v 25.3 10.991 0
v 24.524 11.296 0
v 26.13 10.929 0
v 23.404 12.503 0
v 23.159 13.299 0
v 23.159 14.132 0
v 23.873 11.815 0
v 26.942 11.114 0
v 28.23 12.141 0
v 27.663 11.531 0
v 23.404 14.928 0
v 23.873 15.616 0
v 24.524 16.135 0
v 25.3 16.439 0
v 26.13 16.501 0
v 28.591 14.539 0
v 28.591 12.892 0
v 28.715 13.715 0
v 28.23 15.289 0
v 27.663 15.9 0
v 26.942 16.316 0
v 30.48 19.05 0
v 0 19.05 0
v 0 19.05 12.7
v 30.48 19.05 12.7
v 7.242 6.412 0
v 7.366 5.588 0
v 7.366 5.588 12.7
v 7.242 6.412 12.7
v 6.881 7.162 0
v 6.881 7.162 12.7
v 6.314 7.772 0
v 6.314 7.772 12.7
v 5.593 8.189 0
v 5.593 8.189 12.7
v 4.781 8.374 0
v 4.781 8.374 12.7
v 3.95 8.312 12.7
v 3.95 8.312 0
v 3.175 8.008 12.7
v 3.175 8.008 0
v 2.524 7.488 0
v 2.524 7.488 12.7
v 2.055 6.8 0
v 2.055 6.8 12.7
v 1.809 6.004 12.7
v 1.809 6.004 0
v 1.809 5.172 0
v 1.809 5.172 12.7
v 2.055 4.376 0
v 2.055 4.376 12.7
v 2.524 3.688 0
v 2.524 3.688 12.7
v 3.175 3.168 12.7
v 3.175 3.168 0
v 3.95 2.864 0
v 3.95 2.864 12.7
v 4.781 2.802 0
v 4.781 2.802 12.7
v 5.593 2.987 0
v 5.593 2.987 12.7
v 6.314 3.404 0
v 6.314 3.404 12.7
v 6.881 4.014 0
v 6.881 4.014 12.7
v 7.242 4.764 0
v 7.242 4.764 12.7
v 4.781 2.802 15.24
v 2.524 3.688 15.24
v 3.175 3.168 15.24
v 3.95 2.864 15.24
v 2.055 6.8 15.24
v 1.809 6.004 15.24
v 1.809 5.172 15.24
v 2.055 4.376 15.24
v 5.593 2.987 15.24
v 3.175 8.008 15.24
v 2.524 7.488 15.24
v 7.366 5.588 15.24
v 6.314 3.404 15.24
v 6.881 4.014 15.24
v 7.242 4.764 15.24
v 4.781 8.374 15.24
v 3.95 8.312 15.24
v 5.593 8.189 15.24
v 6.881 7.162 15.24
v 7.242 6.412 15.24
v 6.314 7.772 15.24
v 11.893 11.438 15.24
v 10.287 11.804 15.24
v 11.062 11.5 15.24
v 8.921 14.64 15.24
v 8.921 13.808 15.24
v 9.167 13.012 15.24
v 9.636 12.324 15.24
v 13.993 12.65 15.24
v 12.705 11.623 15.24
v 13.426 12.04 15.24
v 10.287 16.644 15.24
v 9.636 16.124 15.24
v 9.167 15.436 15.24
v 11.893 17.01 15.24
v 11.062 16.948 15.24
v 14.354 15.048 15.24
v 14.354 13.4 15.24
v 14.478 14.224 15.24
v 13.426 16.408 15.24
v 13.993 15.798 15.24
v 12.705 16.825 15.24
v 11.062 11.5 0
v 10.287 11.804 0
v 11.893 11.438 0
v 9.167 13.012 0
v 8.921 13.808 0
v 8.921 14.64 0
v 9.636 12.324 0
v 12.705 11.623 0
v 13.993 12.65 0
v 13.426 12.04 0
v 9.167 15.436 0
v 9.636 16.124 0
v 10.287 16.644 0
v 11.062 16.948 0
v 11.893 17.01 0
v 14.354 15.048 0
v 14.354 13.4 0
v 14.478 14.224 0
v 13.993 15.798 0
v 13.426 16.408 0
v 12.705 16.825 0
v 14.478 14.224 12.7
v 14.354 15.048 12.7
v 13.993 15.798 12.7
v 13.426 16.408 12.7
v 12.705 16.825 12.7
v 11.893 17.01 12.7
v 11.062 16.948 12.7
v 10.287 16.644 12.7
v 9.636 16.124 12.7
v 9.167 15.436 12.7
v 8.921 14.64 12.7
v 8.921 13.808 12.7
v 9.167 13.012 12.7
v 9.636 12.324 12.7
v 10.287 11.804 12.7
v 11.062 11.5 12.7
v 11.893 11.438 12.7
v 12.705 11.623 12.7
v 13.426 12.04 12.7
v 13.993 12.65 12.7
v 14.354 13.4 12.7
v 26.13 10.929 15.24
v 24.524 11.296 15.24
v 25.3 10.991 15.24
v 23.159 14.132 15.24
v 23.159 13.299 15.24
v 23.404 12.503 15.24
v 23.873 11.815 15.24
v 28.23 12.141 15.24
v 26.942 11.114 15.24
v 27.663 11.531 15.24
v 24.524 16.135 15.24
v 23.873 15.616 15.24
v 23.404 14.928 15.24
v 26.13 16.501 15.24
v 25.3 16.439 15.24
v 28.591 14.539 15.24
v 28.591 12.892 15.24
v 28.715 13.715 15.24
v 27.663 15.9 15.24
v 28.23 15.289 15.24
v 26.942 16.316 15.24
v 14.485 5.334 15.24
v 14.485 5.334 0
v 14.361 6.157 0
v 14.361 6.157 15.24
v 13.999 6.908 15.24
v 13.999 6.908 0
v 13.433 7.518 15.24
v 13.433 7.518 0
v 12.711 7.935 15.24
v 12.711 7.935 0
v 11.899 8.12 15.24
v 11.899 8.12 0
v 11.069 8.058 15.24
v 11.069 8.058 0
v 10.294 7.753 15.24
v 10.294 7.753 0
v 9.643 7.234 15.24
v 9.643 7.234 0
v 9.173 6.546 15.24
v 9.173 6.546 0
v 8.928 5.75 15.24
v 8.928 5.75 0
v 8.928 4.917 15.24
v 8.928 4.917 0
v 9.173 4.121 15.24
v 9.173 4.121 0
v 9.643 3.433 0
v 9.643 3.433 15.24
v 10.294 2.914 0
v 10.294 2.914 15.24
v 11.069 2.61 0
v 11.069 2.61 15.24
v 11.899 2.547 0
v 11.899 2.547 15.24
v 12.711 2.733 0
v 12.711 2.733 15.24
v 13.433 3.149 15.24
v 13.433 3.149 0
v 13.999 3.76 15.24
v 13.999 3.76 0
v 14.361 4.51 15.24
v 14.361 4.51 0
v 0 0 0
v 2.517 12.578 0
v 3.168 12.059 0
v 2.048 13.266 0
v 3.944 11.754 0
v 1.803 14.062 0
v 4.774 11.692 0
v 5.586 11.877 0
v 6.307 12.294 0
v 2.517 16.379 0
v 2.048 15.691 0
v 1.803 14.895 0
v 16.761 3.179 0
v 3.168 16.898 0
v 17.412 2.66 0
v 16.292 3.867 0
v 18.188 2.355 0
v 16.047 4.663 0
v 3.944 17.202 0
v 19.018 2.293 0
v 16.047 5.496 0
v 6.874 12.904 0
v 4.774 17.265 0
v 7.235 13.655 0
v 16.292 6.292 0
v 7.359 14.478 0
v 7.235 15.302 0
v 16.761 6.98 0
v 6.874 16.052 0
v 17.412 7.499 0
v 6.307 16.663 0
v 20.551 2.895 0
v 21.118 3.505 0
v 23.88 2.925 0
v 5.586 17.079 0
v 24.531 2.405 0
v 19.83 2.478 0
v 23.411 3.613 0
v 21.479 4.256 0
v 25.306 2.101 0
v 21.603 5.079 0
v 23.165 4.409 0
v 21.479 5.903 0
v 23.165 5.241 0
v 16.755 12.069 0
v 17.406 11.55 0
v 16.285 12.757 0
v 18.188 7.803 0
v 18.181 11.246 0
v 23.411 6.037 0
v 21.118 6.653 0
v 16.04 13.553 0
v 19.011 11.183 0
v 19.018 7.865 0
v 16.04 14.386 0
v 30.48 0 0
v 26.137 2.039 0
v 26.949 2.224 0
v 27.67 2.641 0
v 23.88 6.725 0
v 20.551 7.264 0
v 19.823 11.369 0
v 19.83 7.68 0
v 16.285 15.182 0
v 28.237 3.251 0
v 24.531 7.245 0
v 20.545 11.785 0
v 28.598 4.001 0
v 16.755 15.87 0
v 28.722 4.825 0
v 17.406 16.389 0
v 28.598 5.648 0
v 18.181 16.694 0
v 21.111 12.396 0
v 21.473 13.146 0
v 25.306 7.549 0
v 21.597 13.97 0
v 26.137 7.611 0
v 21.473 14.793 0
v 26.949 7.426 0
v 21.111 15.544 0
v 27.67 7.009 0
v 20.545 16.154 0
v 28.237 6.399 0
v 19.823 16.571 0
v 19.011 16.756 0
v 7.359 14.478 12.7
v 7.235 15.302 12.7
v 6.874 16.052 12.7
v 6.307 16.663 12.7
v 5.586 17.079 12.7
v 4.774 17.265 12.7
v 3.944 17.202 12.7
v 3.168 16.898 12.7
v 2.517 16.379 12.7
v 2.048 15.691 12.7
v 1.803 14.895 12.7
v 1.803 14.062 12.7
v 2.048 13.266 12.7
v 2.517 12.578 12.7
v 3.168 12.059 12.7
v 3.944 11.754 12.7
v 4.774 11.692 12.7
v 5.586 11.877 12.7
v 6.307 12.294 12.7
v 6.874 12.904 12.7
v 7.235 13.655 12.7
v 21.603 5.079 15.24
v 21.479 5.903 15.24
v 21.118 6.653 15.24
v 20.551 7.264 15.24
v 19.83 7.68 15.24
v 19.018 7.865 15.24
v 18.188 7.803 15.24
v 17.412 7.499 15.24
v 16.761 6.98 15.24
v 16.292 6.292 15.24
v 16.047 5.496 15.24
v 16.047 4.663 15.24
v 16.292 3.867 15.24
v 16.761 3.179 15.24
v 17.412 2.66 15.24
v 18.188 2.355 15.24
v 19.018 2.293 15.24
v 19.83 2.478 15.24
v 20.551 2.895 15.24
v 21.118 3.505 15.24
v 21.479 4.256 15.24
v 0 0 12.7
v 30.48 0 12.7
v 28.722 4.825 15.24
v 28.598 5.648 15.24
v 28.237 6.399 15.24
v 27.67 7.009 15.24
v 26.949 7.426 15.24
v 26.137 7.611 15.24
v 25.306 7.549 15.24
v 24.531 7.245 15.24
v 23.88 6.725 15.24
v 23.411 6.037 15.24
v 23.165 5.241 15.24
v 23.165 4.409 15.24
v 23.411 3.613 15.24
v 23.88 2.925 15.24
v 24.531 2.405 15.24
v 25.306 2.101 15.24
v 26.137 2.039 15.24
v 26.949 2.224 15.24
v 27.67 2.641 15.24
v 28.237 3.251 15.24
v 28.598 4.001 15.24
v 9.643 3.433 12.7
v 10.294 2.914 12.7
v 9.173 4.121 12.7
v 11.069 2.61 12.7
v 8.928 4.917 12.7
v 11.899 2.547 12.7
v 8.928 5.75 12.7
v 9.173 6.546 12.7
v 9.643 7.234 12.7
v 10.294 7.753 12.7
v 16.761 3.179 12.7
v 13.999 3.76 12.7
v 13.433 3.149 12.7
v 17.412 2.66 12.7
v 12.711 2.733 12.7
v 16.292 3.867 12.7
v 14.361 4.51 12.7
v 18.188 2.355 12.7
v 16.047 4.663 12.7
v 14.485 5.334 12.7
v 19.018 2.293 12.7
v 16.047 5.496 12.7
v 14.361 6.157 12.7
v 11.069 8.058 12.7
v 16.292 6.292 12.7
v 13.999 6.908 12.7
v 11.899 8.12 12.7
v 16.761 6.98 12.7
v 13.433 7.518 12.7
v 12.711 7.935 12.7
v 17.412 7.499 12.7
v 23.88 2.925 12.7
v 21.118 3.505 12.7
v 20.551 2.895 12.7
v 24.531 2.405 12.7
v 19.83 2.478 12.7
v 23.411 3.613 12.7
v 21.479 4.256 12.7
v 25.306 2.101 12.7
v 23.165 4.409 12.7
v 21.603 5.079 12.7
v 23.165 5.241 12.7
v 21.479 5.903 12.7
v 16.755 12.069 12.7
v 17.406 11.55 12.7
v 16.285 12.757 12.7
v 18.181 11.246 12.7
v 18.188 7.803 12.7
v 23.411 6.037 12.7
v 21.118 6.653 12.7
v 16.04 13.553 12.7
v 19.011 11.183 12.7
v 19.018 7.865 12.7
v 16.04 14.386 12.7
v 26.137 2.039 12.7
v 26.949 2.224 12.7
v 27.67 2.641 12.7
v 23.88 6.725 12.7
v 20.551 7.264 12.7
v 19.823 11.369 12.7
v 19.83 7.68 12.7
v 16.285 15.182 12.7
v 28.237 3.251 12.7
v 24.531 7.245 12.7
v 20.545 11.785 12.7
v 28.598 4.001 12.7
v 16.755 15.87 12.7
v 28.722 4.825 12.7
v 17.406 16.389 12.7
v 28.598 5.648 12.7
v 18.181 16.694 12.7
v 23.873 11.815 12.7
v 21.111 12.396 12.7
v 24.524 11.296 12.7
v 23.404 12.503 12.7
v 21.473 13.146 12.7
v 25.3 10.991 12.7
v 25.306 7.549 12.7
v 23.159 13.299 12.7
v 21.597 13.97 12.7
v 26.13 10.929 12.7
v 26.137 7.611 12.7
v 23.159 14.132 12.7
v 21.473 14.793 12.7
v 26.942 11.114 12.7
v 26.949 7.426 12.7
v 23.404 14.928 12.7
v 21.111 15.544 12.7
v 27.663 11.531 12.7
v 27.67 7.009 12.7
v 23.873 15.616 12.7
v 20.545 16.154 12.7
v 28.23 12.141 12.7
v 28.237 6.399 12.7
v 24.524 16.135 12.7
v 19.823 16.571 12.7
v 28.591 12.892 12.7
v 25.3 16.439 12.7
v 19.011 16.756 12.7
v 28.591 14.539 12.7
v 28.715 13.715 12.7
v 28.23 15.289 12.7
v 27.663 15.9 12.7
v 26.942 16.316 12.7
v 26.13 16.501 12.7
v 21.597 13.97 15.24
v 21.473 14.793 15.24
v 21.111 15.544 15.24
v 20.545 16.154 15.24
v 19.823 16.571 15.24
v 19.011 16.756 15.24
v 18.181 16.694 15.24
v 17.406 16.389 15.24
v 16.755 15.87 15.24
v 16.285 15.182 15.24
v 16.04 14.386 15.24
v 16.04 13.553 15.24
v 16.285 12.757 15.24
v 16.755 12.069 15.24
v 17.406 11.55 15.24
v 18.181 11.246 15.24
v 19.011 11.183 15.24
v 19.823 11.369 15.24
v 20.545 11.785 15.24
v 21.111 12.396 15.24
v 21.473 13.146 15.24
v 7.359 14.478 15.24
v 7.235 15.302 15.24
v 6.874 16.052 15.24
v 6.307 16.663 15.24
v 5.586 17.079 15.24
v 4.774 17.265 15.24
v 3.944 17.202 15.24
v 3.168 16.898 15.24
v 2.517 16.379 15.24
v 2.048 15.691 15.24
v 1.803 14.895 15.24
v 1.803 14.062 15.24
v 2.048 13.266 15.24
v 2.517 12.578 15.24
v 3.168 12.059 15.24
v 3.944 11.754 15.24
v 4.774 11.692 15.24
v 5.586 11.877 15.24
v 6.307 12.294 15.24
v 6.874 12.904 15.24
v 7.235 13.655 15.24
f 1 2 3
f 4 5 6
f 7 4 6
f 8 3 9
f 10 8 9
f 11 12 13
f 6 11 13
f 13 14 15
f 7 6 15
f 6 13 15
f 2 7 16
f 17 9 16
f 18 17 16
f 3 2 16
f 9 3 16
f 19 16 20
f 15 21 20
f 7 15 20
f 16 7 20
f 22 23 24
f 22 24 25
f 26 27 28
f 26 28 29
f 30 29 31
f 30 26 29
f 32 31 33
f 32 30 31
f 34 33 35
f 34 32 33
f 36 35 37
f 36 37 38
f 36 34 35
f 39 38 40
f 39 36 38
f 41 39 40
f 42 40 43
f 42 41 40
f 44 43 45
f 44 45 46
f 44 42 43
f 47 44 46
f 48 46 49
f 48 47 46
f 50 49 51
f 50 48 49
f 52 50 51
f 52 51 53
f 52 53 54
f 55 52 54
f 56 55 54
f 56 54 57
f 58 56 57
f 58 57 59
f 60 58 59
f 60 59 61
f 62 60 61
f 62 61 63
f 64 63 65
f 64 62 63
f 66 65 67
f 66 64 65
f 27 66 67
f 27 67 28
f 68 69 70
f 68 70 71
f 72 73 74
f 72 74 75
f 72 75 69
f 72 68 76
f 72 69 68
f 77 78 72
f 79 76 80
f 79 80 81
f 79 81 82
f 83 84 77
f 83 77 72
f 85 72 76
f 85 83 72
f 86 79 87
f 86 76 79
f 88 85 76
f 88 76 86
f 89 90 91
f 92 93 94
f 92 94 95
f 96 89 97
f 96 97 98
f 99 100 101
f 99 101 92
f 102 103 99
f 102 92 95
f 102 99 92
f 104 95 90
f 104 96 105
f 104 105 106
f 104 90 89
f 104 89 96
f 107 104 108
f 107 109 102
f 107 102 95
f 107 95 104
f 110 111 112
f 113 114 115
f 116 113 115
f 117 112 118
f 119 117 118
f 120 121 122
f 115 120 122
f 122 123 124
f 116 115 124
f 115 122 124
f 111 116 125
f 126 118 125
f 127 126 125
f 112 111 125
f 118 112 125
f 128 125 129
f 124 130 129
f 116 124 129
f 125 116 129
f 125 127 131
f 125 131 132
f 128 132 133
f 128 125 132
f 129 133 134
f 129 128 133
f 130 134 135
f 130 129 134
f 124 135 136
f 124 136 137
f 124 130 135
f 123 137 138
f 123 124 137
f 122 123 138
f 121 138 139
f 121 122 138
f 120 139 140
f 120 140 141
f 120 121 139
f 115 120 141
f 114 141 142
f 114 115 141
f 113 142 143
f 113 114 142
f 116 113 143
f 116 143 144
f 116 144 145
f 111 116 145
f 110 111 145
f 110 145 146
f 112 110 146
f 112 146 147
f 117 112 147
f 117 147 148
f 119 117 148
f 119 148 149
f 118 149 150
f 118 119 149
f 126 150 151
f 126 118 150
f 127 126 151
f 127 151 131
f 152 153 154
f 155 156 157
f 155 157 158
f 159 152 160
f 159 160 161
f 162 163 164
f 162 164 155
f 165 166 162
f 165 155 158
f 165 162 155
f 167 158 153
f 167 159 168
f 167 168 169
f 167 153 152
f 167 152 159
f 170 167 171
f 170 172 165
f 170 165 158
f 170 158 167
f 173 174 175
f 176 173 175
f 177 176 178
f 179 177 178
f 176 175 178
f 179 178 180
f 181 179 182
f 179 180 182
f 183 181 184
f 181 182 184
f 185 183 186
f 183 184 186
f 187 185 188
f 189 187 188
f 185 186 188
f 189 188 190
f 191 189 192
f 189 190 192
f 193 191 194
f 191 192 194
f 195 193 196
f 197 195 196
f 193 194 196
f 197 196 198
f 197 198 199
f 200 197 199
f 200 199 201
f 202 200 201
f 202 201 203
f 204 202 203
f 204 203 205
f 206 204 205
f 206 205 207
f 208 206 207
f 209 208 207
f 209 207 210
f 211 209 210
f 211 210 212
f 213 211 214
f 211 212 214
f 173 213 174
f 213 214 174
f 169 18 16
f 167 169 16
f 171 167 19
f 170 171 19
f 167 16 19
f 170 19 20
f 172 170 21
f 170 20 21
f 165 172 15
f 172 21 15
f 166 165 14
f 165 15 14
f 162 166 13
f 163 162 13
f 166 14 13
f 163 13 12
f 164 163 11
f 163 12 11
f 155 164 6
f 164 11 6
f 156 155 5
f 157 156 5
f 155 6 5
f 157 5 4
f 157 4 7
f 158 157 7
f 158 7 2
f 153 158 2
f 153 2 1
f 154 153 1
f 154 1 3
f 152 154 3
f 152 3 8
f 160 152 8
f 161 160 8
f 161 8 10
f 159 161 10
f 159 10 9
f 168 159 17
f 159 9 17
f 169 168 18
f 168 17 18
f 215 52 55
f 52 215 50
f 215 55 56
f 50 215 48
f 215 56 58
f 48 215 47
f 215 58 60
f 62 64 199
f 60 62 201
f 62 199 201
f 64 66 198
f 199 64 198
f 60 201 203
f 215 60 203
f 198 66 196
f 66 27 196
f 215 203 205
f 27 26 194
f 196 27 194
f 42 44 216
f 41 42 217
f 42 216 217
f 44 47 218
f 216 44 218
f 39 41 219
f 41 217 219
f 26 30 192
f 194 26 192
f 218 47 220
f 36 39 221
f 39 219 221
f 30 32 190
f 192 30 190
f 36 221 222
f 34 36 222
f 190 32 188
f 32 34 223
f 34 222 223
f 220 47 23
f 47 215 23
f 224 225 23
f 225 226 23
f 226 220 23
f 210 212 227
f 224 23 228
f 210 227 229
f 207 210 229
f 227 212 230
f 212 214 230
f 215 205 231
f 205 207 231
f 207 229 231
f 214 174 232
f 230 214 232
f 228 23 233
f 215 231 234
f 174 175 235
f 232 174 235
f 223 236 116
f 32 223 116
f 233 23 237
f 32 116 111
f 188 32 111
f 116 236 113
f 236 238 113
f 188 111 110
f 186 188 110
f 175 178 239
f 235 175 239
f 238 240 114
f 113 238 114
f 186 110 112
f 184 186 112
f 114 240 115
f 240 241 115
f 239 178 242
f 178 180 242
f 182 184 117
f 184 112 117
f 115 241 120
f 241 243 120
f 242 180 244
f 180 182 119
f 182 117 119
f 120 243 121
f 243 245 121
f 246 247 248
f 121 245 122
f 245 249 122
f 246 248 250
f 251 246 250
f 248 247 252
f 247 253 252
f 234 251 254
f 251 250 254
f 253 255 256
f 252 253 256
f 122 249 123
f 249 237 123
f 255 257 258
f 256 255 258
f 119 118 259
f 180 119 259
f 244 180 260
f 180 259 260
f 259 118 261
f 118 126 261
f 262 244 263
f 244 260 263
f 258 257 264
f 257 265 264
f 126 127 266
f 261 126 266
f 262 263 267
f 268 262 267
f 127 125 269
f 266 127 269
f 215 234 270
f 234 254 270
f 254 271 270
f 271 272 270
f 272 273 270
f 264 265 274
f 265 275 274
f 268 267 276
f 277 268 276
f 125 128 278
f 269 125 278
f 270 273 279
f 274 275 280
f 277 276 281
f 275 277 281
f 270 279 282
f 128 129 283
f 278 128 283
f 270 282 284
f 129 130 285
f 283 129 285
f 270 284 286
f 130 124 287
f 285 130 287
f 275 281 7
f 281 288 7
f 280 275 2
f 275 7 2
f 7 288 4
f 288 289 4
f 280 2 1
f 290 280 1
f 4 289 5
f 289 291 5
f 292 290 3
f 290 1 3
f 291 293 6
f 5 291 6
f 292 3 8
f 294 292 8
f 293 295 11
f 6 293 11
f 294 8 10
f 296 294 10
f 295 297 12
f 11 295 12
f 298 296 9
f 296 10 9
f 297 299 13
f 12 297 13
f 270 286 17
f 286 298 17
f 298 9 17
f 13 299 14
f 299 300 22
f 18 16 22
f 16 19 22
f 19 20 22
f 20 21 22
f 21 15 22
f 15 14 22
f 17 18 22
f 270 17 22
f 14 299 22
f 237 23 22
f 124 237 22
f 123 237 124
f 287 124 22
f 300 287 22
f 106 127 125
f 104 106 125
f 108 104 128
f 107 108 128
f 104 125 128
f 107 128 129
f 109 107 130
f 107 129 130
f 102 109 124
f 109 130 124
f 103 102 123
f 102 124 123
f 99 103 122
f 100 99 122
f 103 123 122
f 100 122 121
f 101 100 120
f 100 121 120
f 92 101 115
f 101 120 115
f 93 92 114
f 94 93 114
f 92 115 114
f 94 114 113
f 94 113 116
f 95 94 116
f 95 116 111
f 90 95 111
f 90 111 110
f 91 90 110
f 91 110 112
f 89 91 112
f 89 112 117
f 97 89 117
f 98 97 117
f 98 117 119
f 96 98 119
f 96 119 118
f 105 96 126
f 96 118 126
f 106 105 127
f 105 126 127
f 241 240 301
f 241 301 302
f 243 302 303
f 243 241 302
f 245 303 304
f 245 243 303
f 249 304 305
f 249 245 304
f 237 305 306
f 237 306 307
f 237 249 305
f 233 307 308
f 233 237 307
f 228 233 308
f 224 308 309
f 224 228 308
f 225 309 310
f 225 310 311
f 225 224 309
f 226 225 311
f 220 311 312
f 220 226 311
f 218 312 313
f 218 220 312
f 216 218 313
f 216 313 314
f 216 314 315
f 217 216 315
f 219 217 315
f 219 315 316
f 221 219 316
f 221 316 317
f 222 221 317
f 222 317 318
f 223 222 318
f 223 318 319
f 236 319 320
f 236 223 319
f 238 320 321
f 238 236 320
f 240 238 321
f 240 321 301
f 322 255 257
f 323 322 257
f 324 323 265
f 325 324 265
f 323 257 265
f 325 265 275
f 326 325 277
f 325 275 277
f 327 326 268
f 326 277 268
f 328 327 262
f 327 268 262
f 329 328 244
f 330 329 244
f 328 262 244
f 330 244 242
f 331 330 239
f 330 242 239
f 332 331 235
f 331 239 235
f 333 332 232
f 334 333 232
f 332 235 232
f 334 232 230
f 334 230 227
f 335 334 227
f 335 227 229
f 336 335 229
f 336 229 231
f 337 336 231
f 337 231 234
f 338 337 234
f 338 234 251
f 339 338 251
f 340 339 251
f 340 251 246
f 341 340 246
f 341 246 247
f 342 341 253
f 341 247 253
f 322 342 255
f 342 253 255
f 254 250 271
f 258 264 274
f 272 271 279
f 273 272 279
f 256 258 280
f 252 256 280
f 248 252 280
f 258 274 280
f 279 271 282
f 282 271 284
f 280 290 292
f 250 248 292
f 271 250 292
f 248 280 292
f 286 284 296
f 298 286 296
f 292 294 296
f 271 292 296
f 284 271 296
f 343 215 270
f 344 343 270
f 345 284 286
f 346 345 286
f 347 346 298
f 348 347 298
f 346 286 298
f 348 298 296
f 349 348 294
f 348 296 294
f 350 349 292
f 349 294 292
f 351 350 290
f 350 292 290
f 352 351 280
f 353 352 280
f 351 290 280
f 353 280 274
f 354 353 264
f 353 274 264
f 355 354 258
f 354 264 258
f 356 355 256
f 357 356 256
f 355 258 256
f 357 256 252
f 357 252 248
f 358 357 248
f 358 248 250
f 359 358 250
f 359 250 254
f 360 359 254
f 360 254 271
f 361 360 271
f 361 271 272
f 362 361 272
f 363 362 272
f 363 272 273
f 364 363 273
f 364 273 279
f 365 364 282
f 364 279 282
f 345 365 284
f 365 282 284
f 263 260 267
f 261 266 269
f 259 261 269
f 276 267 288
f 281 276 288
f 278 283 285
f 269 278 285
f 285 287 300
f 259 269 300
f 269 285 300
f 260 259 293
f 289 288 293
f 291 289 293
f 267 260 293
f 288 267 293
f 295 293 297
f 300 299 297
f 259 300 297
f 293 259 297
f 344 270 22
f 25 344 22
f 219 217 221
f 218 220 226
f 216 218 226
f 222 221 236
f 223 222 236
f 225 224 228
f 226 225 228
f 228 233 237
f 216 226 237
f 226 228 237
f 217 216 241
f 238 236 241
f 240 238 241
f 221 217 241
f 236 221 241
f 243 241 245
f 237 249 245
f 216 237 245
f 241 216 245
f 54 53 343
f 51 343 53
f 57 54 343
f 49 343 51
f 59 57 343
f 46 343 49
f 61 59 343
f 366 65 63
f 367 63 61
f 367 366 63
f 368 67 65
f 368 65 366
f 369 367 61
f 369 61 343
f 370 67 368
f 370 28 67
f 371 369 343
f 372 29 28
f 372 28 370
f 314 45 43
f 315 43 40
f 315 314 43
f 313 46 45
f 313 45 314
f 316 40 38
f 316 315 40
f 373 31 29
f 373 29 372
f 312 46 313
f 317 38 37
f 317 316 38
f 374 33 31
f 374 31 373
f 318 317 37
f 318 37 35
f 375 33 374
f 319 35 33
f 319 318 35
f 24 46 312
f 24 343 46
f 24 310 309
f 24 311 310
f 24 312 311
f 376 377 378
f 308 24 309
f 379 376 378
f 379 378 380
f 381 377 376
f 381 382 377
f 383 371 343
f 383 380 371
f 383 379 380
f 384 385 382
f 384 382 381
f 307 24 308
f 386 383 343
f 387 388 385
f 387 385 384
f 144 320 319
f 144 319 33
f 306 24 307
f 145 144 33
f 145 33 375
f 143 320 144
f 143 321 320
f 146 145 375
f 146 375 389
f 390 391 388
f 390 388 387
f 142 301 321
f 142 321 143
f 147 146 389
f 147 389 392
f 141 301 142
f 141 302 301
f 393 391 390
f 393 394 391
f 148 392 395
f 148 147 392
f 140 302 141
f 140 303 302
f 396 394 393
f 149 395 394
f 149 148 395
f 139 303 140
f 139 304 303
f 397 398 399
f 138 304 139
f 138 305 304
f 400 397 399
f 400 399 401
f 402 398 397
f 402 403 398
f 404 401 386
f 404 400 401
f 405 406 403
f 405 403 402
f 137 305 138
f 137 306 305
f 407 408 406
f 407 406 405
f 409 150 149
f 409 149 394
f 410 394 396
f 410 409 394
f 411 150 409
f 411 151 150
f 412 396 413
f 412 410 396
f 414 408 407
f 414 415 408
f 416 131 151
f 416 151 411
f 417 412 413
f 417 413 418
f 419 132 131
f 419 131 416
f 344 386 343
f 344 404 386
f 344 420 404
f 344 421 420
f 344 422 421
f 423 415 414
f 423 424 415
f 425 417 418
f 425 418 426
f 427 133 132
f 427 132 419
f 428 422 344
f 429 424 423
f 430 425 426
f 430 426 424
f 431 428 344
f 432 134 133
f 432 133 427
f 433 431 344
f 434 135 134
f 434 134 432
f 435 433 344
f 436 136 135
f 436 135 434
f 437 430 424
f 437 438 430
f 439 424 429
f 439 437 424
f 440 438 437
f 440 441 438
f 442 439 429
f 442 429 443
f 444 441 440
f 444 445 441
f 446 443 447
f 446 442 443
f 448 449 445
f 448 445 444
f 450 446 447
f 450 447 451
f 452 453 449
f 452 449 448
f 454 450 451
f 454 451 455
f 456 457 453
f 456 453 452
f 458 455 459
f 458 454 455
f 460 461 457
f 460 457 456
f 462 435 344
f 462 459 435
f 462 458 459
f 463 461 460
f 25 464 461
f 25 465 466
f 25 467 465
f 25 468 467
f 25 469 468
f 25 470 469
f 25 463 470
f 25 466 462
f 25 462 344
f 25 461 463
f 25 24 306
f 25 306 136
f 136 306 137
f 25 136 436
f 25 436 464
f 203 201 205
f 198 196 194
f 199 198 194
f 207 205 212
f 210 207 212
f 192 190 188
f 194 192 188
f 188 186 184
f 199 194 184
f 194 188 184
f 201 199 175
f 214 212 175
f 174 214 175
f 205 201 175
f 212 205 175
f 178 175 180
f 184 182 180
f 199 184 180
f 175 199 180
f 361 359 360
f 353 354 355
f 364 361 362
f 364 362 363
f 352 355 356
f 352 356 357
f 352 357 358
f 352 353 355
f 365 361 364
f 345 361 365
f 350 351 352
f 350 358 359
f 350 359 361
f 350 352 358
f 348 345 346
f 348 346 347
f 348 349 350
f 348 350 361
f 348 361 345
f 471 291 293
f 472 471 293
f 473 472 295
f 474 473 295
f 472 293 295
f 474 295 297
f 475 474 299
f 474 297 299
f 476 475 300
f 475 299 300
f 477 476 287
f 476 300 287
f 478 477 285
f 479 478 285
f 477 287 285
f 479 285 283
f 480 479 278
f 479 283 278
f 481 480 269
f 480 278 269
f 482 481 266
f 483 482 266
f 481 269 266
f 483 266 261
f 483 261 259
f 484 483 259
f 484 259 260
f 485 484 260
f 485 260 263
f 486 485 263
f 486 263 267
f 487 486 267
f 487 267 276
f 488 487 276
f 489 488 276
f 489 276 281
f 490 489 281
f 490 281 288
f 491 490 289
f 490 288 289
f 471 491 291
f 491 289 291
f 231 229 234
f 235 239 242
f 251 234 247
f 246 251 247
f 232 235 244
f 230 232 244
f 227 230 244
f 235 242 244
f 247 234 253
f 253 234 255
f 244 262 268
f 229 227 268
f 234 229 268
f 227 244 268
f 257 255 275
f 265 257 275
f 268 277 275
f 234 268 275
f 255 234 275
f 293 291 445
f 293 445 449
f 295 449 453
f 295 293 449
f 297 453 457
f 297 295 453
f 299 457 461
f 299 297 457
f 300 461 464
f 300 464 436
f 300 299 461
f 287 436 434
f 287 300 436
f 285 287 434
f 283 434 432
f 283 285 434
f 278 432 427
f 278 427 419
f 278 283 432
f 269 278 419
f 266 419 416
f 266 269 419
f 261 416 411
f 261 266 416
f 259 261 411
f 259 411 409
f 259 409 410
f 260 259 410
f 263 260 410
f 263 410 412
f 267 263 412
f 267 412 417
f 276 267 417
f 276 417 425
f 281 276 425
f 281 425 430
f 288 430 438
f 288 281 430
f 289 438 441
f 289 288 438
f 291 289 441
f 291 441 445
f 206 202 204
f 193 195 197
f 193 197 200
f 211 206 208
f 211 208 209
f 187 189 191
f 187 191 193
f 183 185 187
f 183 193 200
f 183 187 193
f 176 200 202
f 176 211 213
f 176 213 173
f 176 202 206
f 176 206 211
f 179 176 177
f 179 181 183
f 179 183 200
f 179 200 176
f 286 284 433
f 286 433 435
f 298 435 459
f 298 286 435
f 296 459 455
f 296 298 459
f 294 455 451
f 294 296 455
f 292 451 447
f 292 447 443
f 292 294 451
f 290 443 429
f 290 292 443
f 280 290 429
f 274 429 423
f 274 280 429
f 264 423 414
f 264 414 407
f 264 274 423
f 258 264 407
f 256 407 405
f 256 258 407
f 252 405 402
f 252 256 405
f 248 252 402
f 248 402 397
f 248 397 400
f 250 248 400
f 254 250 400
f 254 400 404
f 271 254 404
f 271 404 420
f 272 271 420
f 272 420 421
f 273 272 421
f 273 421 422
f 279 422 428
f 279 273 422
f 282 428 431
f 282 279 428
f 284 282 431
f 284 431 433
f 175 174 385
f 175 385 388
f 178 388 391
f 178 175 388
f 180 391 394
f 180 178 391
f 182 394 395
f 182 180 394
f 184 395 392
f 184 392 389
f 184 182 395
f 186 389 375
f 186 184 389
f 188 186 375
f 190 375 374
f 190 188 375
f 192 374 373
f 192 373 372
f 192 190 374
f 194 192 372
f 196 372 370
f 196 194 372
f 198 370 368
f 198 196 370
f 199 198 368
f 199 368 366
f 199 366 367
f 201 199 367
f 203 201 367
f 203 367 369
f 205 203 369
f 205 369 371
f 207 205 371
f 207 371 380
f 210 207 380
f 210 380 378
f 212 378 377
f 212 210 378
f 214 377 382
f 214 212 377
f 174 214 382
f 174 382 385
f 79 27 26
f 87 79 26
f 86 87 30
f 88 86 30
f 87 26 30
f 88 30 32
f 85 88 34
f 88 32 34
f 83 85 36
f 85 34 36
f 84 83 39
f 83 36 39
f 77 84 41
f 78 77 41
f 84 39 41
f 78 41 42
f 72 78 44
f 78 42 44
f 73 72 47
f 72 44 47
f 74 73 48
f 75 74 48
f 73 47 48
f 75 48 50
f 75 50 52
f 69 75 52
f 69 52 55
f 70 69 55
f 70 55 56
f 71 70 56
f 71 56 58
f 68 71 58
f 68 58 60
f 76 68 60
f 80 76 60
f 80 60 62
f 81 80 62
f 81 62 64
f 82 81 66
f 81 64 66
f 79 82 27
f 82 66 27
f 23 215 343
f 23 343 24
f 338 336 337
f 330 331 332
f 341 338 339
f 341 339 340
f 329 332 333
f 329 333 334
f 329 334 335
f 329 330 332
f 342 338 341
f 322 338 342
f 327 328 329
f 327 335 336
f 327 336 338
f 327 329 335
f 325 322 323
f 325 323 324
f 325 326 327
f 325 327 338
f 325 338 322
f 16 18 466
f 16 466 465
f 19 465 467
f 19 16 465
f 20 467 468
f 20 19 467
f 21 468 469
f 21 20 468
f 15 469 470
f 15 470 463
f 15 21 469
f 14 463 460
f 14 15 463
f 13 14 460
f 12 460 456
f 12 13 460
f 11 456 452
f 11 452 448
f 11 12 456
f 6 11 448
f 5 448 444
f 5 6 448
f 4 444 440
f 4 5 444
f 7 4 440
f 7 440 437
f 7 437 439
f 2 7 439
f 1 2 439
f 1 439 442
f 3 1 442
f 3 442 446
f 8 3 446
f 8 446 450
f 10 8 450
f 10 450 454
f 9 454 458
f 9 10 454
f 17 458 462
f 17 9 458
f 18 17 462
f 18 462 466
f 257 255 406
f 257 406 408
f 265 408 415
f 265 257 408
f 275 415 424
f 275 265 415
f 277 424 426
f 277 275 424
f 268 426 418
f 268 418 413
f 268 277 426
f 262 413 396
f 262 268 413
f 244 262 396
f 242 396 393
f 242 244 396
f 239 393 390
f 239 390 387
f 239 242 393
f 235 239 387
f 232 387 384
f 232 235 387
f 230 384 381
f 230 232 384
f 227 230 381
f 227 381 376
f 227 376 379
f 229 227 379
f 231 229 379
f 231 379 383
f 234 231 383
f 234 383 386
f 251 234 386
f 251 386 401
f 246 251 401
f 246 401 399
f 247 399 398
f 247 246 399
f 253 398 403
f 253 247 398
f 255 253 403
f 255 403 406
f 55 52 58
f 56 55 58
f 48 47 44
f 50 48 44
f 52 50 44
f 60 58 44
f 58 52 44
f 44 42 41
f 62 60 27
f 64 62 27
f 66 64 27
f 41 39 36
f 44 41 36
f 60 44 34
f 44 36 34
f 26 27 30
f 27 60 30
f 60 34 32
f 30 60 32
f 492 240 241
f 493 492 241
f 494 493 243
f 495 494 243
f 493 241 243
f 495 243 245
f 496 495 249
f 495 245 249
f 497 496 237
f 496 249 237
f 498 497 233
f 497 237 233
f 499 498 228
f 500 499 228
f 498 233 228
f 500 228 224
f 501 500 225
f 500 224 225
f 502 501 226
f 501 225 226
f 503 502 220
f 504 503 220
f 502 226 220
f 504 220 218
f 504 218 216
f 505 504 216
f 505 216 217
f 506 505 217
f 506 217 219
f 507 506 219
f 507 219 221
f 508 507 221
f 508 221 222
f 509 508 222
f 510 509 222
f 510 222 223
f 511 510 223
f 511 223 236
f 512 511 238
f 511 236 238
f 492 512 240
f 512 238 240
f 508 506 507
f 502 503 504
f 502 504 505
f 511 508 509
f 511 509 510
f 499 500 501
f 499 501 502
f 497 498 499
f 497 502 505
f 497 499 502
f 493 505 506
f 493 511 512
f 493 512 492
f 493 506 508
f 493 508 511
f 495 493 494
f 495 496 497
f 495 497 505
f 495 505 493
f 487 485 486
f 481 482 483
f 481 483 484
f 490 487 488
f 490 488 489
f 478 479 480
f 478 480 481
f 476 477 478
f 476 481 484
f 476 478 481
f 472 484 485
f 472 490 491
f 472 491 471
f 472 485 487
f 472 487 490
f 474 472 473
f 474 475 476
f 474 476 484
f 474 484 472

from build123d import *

# Parameters (mm, degrees)
F0_R     = 2.794
F1_DEPTH = 15.24
F0_W     = 30.48
F0_H     = 19.05
F2_DEPTH = 12.7


with BuildPart() as f1:
    # F0 (on Top) → F1 (new body)
    with BuildSketch(Plane.XY):
        with Locations((4.565305, 14.478351)):
            Circle(F0_R)
        with Locations((11.684, 14.224)):
            Circle(F0_R)
        with Locations((18.802695, 13.969649)):
            Circle(F0_R)
        with Locations((25.921391, 13.715298)):
            Circle(F0_R)
        with Locations((25.928086, 4.824947)):
            Circle(F0_R)
        with Locations((18.809391, 5.079298)):
            Circle(F0_R)
        with Locations((11.690695, 5.333649)):
            Circle(F0_R)
        with Locations((4.572, 5.588)):
            Circle(F0_R)
    extrude(amount=F1_DEPTH)


with BuildPart() as f2:
    # F0 (on Top) → F2 (new body)
    with BuildSketch(Plane.XY):
        with Locations((15.24, 9.525)):
            Rectangle(F0_W, F0_H)
        with Locations((4.572, 5.588)):
            Circle(F0_R, mode=Mode.SUBTRACT)
        with Locations((11.690695, 5.333649)):
            Circle(F0_R, mode=Mode.SUBTRACT)
        with Locations((18.809391, 5.079298)):
            Circle(F0_R, mode=Mode.SUBTRACT)
        with Locations((25.928086, 4.824947)):
            Circle(F0_R, mode=Mode.SUBTRACT)
        with Locations((11.684, 14.224)):
            Circle(F0_R, mode=Mode.SUBTRACT)
        with Locations((4.565305, 14.478351)):
            Circle(F0_R, mode=Mode.SUBTRACT)
        with Locations((18.802695, 13.969649)):
            Circle(F0_R, mode=Mode.SUBTRACT)
        with Locations((25.921391, 13.715298)):
            Circle(F0_R, mode=Mode.SUBTRACT)
    extrude(amount=F2_DEPTH)


solid = Compound([f1.part, f2.part])
